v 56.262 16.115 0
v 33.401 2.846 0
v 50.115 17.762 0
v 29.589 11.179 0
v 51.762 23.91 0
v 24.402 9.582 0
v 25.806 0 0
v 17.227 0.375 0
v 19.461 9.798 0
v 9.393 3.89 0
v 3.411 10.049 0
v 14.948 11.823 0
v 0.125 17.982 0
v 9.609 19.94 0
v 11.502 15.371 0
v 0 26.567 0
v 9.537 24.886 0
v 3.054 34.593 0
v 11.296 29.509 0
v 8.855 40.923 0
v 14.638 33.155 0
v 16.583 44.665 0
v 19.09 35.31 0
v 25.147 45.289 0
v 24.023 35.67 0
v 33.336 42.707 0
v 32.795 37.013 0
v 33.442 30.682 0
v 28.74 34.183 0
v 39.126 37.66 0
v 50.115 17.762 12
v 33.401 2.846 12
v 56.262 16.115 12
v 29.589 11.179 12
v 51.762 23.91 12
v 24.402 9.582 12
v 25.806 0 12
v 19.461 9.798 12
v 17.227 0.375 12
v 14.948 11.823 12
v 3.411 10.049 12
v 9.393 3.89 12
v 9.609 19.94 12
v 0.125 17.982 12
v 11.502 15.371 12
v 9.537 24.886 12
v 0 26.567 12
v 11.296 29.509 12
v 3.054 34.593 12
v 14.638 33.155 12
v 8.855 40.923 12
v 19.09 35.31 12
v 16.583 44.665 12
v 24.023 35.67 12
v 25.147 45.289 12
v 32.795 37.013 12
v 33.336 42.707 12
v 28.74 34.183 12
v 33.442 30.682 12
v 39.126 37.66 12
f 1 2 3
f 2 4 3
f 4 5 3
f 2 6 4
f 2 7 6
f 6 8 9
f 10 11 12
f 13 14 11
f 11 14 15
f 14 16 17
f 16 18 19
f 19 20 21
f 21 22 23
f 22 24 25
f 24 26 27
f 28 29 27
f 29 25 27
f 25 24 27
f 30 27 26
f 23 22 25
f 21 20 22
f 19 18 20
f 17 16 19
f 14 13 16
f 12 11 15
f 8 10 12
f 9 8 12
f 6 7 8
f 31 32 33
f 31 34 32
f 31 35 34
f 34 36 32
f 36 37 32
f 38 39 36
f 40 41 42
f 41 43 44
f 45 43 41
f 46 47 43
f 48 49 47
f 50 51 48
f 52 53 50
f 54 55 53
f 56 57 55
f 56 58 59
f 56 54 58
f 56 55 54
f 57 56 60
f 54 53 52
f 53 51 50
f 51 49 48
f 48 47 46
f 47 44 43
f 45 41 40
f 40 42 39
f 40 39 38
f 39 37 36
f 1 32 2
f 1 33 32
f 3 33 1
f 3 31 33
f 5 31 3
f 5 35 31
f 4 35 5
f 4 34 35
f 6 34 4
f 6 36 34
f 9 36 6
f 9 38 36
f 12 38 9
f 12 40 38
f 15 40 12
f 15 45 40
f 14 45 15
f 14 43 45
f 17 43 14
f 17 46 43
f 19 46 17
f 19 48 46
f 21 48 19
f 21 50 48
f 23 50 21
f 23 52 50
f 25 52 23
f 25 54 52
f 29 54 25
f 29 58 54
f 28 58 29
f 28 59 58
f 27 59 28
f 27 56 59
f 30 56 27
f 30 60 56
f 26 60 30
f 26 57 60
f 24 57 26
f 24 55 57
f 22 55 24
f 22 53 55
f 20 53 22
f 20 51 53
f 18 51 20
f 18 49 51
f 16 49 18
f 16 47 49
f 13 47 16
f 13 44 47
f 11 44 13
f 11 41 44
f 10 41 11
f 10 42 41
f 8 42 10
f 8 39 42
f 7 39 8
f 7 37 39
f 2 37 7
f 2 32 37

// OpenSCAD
$fn = 32;

// ----------------------------------------------------------------------
// Eye lug: ring_tail, 12 mm thick
// ----------------------------------------------------------------------

// --- parameters (mm) ---
profile_height = 12;      // extrusion height
profile_points = 30;      // points of the closed outline

profile = [[32.795, 37.013], [39.126, 37.66], [33.336, 42.707], [25.147, 45.289], [16.583, 44.665], [8.855, 40.923], [3.054, 34.593], [0, 26.567], [0.125, 17.982], [3.411, 10.049], [9.393, 3.89], [17.227, 0.375], [25.806, 0], [33.401, 2.846], [56.262, 16.115], [50.115, 17.762], [51.762, 23.91], [29.589, 11.179], [24.402, 9.582], [19.461, 9.798], [14.948, 11.823], [11.502, 15.371], [9.609, 19.94], [9.537, 24.886], [11.296, 29.509], [14.638, 33.155], [19.09, 35.31], [24.023, 35.67], [28.74, 34.183], [33.442, 30.682]];  // single closed polygon, 30 points, counter clockwise

// --- the one profile operation ---
linear_extrude(height = profile_height) polygon(points = profile);
